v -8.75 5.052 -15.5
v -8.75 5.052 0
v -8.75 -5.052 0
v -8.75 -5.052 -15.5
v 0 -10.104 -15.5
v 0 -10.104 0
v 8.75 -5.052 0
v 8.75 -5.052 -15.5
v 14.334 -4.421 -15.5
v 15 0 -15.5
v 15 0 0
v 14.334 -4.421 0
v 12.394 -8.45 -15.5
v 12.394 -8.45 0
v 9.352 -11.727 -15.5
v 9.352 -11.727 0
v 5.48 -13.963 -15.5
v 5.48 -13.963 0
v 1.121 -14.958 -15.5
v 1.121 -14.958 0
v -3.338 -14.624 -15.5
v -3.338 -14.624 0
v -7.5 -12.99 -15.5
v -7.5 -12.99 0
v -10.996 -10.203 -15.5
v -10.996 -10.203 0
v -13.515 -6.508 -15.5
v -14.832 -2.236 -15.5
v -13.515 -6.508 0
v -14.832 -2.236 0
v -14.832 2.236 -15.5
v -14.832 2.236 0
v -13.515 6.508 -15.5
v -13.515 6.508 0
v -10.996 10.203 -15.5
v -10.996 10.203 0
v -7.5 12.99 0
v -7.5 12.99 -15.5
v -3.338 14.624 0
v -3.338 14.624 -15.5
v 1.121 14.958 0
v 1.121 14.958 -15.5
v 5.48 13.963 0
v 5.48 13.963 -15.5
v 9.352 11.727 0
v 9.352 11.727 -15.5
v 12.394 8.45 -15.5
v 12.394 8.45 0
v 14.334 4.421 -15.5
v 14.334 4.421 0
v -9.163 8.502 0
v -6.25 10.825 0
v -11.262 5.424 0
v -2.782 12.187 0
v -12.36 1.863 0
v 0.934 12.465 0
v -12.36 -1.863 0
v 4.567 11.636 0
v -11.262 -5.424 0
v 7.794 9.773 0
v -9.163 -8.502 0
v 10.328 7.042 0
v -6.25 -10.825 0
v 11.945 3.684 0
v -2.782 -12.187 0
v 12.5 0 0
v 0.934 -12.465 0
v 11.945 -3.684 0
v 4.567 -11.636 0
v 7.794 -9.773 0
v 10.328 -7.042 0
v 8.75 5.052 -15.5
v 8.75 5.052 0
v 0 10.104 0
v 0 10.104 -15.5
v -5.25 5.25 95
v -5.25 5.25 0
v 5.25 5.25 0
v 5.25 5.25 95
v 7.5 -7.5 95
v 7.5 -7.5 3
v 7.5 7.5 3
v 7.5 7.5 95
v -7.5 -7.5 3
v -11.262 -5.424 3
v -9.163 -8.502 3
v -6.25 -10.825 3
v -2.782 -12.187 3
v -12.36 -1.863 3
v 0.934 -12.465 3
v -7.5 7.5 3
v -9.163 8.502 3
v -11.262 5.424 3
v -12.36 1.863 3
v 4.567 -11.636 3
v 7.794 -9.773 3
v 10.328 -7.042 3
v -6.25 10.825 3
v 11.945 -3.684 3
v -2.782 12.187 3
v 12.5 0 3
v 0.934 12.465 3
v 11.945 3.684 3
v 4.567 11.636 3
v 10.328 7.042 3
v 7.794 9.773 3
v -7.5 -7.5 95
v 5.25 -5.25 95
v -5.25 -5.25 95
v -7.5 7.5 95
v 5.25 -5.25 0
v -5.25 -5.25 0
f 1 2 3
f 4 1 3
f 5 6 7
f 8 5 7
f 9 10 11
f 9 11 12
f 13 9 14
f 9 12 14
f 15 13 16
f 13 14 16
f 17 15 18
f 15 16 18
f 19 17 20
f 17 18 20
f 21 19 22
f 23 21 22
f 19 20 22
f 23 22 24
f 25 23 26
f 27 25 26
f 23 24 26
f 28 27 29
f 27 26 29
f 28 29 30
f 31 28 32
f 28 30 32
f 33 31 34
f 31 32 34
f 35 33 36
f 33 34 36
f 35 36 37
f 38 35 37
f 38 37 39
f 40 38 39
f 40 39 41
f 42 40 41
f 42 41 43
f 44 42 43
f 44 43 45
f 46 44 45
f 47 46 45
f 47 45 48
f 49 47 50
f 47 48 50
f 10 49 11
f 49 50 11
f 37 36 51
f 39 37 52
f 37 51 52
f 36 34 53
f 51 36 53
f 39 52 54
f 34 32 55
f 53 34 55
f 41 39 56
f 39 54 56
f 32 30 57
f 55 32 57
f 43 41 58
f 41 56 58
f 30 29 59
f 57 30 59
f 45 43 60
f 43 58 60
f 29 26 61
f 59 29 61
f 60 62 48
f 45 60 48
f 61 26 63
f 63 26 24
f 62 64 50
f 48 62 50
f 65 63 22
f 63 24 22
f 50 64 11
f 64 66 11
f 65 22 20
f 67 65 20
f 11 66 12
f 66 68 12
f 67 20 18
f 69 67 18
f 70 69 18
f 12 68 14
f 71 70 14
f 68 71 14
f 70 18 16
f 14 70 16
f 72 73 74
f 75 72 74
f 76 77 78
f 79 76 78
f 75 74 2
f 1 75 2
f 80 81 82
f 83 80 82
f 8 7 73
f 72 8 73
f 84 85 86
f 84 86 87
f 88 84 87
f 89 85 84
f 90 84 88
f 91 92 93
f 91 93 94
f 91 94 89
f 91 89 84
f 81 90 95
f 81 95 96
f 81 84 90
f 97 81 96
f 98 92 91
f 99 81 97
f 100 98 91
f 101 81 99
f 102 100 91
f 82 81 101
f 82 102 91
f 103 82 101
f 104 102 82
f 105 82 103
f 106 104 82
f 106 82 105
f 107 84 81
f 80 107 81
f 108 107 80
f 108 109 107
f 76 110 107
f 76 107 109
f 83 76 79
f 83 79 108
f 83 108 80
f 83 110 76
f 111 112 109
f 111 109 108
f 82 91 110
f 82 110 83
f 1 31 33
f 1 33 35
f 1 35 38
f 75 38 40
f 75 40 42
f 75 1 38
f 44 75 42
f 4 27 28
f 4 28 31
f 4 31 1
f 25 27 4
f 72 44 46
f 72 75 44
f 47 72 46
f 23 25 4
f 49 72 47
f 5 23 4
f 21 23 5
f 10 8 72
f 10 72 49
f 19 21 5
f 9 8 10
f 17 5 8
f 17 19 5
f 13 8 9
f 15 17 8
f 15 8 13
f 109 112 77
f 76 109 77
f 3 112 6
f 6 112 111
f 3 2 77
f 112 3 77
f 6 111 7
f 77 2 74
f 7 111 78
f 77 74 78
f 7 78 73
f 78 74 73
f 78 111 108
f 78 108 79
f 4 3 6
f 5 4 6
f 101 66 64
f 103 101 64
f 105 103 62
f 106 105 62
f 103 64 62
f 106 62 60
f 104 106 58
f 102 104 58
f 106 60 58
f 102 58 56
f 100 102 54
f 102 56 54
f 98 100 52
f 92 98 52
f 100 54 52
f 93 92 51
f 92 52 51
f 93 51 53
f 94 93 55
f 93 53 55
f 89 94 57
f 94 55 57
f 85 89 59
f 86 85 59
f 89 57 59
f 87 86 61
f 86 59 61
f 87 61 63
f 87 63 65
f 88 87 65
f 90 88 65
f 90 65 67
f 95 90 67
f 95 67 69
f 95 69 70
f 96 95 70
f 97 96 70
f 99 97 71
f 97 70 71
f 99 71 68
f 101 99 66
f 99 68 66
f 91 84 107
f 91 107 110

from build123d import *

# Parameters (mm, degrees)
F0_W     = 15
F0_H     = 15
F0_W_2   = 10.5
F0_H_2   = 10.5
F1_DEPTH = 95
F2_R     = 15
F3_DEPTH = 15.5
F4_R     = 12.5
F4_W     = 15
F4_H     = 15
F5_DEPTH = 3


with BuildPart() as f1:
    # F0 (on Top) → F1 (new body)
    with BuildSketch(Plane.XY):
        Rectangle(F0_W, F0_H)
        Rectangle(F0_W_2, F0_H_2, mode=Mode.SUBTRACT)
    extrude(amount=F1_DEPTH)

    # F2 (on face) → F3 (join)
    with BuildSketch(Plane(origin=(0, 0, 0), x_dir=(1, 0, 0), z_dir=(0, 0, -1))):
        Circle(F2_R)
        Polygon((0, -10.10363), (-8.75, -5.051815), (-8.75, 5.051815), (0, 10.10363), (8.75, 5.051815), (8.75, -5.051815), align=None, mode=Mode.SUBTRACT)
    extrude(amount=F3_DEPTH)

    # F4 (on face) → F5 (join)
    with BuildSketch(Plane.XY):
        Circle(F4_R)
        Rectangle(F4_W, F4_H, mode=Mode.SUBTRACT)
    extrude(amount=F5_DEPTH)


solid = f1.part
